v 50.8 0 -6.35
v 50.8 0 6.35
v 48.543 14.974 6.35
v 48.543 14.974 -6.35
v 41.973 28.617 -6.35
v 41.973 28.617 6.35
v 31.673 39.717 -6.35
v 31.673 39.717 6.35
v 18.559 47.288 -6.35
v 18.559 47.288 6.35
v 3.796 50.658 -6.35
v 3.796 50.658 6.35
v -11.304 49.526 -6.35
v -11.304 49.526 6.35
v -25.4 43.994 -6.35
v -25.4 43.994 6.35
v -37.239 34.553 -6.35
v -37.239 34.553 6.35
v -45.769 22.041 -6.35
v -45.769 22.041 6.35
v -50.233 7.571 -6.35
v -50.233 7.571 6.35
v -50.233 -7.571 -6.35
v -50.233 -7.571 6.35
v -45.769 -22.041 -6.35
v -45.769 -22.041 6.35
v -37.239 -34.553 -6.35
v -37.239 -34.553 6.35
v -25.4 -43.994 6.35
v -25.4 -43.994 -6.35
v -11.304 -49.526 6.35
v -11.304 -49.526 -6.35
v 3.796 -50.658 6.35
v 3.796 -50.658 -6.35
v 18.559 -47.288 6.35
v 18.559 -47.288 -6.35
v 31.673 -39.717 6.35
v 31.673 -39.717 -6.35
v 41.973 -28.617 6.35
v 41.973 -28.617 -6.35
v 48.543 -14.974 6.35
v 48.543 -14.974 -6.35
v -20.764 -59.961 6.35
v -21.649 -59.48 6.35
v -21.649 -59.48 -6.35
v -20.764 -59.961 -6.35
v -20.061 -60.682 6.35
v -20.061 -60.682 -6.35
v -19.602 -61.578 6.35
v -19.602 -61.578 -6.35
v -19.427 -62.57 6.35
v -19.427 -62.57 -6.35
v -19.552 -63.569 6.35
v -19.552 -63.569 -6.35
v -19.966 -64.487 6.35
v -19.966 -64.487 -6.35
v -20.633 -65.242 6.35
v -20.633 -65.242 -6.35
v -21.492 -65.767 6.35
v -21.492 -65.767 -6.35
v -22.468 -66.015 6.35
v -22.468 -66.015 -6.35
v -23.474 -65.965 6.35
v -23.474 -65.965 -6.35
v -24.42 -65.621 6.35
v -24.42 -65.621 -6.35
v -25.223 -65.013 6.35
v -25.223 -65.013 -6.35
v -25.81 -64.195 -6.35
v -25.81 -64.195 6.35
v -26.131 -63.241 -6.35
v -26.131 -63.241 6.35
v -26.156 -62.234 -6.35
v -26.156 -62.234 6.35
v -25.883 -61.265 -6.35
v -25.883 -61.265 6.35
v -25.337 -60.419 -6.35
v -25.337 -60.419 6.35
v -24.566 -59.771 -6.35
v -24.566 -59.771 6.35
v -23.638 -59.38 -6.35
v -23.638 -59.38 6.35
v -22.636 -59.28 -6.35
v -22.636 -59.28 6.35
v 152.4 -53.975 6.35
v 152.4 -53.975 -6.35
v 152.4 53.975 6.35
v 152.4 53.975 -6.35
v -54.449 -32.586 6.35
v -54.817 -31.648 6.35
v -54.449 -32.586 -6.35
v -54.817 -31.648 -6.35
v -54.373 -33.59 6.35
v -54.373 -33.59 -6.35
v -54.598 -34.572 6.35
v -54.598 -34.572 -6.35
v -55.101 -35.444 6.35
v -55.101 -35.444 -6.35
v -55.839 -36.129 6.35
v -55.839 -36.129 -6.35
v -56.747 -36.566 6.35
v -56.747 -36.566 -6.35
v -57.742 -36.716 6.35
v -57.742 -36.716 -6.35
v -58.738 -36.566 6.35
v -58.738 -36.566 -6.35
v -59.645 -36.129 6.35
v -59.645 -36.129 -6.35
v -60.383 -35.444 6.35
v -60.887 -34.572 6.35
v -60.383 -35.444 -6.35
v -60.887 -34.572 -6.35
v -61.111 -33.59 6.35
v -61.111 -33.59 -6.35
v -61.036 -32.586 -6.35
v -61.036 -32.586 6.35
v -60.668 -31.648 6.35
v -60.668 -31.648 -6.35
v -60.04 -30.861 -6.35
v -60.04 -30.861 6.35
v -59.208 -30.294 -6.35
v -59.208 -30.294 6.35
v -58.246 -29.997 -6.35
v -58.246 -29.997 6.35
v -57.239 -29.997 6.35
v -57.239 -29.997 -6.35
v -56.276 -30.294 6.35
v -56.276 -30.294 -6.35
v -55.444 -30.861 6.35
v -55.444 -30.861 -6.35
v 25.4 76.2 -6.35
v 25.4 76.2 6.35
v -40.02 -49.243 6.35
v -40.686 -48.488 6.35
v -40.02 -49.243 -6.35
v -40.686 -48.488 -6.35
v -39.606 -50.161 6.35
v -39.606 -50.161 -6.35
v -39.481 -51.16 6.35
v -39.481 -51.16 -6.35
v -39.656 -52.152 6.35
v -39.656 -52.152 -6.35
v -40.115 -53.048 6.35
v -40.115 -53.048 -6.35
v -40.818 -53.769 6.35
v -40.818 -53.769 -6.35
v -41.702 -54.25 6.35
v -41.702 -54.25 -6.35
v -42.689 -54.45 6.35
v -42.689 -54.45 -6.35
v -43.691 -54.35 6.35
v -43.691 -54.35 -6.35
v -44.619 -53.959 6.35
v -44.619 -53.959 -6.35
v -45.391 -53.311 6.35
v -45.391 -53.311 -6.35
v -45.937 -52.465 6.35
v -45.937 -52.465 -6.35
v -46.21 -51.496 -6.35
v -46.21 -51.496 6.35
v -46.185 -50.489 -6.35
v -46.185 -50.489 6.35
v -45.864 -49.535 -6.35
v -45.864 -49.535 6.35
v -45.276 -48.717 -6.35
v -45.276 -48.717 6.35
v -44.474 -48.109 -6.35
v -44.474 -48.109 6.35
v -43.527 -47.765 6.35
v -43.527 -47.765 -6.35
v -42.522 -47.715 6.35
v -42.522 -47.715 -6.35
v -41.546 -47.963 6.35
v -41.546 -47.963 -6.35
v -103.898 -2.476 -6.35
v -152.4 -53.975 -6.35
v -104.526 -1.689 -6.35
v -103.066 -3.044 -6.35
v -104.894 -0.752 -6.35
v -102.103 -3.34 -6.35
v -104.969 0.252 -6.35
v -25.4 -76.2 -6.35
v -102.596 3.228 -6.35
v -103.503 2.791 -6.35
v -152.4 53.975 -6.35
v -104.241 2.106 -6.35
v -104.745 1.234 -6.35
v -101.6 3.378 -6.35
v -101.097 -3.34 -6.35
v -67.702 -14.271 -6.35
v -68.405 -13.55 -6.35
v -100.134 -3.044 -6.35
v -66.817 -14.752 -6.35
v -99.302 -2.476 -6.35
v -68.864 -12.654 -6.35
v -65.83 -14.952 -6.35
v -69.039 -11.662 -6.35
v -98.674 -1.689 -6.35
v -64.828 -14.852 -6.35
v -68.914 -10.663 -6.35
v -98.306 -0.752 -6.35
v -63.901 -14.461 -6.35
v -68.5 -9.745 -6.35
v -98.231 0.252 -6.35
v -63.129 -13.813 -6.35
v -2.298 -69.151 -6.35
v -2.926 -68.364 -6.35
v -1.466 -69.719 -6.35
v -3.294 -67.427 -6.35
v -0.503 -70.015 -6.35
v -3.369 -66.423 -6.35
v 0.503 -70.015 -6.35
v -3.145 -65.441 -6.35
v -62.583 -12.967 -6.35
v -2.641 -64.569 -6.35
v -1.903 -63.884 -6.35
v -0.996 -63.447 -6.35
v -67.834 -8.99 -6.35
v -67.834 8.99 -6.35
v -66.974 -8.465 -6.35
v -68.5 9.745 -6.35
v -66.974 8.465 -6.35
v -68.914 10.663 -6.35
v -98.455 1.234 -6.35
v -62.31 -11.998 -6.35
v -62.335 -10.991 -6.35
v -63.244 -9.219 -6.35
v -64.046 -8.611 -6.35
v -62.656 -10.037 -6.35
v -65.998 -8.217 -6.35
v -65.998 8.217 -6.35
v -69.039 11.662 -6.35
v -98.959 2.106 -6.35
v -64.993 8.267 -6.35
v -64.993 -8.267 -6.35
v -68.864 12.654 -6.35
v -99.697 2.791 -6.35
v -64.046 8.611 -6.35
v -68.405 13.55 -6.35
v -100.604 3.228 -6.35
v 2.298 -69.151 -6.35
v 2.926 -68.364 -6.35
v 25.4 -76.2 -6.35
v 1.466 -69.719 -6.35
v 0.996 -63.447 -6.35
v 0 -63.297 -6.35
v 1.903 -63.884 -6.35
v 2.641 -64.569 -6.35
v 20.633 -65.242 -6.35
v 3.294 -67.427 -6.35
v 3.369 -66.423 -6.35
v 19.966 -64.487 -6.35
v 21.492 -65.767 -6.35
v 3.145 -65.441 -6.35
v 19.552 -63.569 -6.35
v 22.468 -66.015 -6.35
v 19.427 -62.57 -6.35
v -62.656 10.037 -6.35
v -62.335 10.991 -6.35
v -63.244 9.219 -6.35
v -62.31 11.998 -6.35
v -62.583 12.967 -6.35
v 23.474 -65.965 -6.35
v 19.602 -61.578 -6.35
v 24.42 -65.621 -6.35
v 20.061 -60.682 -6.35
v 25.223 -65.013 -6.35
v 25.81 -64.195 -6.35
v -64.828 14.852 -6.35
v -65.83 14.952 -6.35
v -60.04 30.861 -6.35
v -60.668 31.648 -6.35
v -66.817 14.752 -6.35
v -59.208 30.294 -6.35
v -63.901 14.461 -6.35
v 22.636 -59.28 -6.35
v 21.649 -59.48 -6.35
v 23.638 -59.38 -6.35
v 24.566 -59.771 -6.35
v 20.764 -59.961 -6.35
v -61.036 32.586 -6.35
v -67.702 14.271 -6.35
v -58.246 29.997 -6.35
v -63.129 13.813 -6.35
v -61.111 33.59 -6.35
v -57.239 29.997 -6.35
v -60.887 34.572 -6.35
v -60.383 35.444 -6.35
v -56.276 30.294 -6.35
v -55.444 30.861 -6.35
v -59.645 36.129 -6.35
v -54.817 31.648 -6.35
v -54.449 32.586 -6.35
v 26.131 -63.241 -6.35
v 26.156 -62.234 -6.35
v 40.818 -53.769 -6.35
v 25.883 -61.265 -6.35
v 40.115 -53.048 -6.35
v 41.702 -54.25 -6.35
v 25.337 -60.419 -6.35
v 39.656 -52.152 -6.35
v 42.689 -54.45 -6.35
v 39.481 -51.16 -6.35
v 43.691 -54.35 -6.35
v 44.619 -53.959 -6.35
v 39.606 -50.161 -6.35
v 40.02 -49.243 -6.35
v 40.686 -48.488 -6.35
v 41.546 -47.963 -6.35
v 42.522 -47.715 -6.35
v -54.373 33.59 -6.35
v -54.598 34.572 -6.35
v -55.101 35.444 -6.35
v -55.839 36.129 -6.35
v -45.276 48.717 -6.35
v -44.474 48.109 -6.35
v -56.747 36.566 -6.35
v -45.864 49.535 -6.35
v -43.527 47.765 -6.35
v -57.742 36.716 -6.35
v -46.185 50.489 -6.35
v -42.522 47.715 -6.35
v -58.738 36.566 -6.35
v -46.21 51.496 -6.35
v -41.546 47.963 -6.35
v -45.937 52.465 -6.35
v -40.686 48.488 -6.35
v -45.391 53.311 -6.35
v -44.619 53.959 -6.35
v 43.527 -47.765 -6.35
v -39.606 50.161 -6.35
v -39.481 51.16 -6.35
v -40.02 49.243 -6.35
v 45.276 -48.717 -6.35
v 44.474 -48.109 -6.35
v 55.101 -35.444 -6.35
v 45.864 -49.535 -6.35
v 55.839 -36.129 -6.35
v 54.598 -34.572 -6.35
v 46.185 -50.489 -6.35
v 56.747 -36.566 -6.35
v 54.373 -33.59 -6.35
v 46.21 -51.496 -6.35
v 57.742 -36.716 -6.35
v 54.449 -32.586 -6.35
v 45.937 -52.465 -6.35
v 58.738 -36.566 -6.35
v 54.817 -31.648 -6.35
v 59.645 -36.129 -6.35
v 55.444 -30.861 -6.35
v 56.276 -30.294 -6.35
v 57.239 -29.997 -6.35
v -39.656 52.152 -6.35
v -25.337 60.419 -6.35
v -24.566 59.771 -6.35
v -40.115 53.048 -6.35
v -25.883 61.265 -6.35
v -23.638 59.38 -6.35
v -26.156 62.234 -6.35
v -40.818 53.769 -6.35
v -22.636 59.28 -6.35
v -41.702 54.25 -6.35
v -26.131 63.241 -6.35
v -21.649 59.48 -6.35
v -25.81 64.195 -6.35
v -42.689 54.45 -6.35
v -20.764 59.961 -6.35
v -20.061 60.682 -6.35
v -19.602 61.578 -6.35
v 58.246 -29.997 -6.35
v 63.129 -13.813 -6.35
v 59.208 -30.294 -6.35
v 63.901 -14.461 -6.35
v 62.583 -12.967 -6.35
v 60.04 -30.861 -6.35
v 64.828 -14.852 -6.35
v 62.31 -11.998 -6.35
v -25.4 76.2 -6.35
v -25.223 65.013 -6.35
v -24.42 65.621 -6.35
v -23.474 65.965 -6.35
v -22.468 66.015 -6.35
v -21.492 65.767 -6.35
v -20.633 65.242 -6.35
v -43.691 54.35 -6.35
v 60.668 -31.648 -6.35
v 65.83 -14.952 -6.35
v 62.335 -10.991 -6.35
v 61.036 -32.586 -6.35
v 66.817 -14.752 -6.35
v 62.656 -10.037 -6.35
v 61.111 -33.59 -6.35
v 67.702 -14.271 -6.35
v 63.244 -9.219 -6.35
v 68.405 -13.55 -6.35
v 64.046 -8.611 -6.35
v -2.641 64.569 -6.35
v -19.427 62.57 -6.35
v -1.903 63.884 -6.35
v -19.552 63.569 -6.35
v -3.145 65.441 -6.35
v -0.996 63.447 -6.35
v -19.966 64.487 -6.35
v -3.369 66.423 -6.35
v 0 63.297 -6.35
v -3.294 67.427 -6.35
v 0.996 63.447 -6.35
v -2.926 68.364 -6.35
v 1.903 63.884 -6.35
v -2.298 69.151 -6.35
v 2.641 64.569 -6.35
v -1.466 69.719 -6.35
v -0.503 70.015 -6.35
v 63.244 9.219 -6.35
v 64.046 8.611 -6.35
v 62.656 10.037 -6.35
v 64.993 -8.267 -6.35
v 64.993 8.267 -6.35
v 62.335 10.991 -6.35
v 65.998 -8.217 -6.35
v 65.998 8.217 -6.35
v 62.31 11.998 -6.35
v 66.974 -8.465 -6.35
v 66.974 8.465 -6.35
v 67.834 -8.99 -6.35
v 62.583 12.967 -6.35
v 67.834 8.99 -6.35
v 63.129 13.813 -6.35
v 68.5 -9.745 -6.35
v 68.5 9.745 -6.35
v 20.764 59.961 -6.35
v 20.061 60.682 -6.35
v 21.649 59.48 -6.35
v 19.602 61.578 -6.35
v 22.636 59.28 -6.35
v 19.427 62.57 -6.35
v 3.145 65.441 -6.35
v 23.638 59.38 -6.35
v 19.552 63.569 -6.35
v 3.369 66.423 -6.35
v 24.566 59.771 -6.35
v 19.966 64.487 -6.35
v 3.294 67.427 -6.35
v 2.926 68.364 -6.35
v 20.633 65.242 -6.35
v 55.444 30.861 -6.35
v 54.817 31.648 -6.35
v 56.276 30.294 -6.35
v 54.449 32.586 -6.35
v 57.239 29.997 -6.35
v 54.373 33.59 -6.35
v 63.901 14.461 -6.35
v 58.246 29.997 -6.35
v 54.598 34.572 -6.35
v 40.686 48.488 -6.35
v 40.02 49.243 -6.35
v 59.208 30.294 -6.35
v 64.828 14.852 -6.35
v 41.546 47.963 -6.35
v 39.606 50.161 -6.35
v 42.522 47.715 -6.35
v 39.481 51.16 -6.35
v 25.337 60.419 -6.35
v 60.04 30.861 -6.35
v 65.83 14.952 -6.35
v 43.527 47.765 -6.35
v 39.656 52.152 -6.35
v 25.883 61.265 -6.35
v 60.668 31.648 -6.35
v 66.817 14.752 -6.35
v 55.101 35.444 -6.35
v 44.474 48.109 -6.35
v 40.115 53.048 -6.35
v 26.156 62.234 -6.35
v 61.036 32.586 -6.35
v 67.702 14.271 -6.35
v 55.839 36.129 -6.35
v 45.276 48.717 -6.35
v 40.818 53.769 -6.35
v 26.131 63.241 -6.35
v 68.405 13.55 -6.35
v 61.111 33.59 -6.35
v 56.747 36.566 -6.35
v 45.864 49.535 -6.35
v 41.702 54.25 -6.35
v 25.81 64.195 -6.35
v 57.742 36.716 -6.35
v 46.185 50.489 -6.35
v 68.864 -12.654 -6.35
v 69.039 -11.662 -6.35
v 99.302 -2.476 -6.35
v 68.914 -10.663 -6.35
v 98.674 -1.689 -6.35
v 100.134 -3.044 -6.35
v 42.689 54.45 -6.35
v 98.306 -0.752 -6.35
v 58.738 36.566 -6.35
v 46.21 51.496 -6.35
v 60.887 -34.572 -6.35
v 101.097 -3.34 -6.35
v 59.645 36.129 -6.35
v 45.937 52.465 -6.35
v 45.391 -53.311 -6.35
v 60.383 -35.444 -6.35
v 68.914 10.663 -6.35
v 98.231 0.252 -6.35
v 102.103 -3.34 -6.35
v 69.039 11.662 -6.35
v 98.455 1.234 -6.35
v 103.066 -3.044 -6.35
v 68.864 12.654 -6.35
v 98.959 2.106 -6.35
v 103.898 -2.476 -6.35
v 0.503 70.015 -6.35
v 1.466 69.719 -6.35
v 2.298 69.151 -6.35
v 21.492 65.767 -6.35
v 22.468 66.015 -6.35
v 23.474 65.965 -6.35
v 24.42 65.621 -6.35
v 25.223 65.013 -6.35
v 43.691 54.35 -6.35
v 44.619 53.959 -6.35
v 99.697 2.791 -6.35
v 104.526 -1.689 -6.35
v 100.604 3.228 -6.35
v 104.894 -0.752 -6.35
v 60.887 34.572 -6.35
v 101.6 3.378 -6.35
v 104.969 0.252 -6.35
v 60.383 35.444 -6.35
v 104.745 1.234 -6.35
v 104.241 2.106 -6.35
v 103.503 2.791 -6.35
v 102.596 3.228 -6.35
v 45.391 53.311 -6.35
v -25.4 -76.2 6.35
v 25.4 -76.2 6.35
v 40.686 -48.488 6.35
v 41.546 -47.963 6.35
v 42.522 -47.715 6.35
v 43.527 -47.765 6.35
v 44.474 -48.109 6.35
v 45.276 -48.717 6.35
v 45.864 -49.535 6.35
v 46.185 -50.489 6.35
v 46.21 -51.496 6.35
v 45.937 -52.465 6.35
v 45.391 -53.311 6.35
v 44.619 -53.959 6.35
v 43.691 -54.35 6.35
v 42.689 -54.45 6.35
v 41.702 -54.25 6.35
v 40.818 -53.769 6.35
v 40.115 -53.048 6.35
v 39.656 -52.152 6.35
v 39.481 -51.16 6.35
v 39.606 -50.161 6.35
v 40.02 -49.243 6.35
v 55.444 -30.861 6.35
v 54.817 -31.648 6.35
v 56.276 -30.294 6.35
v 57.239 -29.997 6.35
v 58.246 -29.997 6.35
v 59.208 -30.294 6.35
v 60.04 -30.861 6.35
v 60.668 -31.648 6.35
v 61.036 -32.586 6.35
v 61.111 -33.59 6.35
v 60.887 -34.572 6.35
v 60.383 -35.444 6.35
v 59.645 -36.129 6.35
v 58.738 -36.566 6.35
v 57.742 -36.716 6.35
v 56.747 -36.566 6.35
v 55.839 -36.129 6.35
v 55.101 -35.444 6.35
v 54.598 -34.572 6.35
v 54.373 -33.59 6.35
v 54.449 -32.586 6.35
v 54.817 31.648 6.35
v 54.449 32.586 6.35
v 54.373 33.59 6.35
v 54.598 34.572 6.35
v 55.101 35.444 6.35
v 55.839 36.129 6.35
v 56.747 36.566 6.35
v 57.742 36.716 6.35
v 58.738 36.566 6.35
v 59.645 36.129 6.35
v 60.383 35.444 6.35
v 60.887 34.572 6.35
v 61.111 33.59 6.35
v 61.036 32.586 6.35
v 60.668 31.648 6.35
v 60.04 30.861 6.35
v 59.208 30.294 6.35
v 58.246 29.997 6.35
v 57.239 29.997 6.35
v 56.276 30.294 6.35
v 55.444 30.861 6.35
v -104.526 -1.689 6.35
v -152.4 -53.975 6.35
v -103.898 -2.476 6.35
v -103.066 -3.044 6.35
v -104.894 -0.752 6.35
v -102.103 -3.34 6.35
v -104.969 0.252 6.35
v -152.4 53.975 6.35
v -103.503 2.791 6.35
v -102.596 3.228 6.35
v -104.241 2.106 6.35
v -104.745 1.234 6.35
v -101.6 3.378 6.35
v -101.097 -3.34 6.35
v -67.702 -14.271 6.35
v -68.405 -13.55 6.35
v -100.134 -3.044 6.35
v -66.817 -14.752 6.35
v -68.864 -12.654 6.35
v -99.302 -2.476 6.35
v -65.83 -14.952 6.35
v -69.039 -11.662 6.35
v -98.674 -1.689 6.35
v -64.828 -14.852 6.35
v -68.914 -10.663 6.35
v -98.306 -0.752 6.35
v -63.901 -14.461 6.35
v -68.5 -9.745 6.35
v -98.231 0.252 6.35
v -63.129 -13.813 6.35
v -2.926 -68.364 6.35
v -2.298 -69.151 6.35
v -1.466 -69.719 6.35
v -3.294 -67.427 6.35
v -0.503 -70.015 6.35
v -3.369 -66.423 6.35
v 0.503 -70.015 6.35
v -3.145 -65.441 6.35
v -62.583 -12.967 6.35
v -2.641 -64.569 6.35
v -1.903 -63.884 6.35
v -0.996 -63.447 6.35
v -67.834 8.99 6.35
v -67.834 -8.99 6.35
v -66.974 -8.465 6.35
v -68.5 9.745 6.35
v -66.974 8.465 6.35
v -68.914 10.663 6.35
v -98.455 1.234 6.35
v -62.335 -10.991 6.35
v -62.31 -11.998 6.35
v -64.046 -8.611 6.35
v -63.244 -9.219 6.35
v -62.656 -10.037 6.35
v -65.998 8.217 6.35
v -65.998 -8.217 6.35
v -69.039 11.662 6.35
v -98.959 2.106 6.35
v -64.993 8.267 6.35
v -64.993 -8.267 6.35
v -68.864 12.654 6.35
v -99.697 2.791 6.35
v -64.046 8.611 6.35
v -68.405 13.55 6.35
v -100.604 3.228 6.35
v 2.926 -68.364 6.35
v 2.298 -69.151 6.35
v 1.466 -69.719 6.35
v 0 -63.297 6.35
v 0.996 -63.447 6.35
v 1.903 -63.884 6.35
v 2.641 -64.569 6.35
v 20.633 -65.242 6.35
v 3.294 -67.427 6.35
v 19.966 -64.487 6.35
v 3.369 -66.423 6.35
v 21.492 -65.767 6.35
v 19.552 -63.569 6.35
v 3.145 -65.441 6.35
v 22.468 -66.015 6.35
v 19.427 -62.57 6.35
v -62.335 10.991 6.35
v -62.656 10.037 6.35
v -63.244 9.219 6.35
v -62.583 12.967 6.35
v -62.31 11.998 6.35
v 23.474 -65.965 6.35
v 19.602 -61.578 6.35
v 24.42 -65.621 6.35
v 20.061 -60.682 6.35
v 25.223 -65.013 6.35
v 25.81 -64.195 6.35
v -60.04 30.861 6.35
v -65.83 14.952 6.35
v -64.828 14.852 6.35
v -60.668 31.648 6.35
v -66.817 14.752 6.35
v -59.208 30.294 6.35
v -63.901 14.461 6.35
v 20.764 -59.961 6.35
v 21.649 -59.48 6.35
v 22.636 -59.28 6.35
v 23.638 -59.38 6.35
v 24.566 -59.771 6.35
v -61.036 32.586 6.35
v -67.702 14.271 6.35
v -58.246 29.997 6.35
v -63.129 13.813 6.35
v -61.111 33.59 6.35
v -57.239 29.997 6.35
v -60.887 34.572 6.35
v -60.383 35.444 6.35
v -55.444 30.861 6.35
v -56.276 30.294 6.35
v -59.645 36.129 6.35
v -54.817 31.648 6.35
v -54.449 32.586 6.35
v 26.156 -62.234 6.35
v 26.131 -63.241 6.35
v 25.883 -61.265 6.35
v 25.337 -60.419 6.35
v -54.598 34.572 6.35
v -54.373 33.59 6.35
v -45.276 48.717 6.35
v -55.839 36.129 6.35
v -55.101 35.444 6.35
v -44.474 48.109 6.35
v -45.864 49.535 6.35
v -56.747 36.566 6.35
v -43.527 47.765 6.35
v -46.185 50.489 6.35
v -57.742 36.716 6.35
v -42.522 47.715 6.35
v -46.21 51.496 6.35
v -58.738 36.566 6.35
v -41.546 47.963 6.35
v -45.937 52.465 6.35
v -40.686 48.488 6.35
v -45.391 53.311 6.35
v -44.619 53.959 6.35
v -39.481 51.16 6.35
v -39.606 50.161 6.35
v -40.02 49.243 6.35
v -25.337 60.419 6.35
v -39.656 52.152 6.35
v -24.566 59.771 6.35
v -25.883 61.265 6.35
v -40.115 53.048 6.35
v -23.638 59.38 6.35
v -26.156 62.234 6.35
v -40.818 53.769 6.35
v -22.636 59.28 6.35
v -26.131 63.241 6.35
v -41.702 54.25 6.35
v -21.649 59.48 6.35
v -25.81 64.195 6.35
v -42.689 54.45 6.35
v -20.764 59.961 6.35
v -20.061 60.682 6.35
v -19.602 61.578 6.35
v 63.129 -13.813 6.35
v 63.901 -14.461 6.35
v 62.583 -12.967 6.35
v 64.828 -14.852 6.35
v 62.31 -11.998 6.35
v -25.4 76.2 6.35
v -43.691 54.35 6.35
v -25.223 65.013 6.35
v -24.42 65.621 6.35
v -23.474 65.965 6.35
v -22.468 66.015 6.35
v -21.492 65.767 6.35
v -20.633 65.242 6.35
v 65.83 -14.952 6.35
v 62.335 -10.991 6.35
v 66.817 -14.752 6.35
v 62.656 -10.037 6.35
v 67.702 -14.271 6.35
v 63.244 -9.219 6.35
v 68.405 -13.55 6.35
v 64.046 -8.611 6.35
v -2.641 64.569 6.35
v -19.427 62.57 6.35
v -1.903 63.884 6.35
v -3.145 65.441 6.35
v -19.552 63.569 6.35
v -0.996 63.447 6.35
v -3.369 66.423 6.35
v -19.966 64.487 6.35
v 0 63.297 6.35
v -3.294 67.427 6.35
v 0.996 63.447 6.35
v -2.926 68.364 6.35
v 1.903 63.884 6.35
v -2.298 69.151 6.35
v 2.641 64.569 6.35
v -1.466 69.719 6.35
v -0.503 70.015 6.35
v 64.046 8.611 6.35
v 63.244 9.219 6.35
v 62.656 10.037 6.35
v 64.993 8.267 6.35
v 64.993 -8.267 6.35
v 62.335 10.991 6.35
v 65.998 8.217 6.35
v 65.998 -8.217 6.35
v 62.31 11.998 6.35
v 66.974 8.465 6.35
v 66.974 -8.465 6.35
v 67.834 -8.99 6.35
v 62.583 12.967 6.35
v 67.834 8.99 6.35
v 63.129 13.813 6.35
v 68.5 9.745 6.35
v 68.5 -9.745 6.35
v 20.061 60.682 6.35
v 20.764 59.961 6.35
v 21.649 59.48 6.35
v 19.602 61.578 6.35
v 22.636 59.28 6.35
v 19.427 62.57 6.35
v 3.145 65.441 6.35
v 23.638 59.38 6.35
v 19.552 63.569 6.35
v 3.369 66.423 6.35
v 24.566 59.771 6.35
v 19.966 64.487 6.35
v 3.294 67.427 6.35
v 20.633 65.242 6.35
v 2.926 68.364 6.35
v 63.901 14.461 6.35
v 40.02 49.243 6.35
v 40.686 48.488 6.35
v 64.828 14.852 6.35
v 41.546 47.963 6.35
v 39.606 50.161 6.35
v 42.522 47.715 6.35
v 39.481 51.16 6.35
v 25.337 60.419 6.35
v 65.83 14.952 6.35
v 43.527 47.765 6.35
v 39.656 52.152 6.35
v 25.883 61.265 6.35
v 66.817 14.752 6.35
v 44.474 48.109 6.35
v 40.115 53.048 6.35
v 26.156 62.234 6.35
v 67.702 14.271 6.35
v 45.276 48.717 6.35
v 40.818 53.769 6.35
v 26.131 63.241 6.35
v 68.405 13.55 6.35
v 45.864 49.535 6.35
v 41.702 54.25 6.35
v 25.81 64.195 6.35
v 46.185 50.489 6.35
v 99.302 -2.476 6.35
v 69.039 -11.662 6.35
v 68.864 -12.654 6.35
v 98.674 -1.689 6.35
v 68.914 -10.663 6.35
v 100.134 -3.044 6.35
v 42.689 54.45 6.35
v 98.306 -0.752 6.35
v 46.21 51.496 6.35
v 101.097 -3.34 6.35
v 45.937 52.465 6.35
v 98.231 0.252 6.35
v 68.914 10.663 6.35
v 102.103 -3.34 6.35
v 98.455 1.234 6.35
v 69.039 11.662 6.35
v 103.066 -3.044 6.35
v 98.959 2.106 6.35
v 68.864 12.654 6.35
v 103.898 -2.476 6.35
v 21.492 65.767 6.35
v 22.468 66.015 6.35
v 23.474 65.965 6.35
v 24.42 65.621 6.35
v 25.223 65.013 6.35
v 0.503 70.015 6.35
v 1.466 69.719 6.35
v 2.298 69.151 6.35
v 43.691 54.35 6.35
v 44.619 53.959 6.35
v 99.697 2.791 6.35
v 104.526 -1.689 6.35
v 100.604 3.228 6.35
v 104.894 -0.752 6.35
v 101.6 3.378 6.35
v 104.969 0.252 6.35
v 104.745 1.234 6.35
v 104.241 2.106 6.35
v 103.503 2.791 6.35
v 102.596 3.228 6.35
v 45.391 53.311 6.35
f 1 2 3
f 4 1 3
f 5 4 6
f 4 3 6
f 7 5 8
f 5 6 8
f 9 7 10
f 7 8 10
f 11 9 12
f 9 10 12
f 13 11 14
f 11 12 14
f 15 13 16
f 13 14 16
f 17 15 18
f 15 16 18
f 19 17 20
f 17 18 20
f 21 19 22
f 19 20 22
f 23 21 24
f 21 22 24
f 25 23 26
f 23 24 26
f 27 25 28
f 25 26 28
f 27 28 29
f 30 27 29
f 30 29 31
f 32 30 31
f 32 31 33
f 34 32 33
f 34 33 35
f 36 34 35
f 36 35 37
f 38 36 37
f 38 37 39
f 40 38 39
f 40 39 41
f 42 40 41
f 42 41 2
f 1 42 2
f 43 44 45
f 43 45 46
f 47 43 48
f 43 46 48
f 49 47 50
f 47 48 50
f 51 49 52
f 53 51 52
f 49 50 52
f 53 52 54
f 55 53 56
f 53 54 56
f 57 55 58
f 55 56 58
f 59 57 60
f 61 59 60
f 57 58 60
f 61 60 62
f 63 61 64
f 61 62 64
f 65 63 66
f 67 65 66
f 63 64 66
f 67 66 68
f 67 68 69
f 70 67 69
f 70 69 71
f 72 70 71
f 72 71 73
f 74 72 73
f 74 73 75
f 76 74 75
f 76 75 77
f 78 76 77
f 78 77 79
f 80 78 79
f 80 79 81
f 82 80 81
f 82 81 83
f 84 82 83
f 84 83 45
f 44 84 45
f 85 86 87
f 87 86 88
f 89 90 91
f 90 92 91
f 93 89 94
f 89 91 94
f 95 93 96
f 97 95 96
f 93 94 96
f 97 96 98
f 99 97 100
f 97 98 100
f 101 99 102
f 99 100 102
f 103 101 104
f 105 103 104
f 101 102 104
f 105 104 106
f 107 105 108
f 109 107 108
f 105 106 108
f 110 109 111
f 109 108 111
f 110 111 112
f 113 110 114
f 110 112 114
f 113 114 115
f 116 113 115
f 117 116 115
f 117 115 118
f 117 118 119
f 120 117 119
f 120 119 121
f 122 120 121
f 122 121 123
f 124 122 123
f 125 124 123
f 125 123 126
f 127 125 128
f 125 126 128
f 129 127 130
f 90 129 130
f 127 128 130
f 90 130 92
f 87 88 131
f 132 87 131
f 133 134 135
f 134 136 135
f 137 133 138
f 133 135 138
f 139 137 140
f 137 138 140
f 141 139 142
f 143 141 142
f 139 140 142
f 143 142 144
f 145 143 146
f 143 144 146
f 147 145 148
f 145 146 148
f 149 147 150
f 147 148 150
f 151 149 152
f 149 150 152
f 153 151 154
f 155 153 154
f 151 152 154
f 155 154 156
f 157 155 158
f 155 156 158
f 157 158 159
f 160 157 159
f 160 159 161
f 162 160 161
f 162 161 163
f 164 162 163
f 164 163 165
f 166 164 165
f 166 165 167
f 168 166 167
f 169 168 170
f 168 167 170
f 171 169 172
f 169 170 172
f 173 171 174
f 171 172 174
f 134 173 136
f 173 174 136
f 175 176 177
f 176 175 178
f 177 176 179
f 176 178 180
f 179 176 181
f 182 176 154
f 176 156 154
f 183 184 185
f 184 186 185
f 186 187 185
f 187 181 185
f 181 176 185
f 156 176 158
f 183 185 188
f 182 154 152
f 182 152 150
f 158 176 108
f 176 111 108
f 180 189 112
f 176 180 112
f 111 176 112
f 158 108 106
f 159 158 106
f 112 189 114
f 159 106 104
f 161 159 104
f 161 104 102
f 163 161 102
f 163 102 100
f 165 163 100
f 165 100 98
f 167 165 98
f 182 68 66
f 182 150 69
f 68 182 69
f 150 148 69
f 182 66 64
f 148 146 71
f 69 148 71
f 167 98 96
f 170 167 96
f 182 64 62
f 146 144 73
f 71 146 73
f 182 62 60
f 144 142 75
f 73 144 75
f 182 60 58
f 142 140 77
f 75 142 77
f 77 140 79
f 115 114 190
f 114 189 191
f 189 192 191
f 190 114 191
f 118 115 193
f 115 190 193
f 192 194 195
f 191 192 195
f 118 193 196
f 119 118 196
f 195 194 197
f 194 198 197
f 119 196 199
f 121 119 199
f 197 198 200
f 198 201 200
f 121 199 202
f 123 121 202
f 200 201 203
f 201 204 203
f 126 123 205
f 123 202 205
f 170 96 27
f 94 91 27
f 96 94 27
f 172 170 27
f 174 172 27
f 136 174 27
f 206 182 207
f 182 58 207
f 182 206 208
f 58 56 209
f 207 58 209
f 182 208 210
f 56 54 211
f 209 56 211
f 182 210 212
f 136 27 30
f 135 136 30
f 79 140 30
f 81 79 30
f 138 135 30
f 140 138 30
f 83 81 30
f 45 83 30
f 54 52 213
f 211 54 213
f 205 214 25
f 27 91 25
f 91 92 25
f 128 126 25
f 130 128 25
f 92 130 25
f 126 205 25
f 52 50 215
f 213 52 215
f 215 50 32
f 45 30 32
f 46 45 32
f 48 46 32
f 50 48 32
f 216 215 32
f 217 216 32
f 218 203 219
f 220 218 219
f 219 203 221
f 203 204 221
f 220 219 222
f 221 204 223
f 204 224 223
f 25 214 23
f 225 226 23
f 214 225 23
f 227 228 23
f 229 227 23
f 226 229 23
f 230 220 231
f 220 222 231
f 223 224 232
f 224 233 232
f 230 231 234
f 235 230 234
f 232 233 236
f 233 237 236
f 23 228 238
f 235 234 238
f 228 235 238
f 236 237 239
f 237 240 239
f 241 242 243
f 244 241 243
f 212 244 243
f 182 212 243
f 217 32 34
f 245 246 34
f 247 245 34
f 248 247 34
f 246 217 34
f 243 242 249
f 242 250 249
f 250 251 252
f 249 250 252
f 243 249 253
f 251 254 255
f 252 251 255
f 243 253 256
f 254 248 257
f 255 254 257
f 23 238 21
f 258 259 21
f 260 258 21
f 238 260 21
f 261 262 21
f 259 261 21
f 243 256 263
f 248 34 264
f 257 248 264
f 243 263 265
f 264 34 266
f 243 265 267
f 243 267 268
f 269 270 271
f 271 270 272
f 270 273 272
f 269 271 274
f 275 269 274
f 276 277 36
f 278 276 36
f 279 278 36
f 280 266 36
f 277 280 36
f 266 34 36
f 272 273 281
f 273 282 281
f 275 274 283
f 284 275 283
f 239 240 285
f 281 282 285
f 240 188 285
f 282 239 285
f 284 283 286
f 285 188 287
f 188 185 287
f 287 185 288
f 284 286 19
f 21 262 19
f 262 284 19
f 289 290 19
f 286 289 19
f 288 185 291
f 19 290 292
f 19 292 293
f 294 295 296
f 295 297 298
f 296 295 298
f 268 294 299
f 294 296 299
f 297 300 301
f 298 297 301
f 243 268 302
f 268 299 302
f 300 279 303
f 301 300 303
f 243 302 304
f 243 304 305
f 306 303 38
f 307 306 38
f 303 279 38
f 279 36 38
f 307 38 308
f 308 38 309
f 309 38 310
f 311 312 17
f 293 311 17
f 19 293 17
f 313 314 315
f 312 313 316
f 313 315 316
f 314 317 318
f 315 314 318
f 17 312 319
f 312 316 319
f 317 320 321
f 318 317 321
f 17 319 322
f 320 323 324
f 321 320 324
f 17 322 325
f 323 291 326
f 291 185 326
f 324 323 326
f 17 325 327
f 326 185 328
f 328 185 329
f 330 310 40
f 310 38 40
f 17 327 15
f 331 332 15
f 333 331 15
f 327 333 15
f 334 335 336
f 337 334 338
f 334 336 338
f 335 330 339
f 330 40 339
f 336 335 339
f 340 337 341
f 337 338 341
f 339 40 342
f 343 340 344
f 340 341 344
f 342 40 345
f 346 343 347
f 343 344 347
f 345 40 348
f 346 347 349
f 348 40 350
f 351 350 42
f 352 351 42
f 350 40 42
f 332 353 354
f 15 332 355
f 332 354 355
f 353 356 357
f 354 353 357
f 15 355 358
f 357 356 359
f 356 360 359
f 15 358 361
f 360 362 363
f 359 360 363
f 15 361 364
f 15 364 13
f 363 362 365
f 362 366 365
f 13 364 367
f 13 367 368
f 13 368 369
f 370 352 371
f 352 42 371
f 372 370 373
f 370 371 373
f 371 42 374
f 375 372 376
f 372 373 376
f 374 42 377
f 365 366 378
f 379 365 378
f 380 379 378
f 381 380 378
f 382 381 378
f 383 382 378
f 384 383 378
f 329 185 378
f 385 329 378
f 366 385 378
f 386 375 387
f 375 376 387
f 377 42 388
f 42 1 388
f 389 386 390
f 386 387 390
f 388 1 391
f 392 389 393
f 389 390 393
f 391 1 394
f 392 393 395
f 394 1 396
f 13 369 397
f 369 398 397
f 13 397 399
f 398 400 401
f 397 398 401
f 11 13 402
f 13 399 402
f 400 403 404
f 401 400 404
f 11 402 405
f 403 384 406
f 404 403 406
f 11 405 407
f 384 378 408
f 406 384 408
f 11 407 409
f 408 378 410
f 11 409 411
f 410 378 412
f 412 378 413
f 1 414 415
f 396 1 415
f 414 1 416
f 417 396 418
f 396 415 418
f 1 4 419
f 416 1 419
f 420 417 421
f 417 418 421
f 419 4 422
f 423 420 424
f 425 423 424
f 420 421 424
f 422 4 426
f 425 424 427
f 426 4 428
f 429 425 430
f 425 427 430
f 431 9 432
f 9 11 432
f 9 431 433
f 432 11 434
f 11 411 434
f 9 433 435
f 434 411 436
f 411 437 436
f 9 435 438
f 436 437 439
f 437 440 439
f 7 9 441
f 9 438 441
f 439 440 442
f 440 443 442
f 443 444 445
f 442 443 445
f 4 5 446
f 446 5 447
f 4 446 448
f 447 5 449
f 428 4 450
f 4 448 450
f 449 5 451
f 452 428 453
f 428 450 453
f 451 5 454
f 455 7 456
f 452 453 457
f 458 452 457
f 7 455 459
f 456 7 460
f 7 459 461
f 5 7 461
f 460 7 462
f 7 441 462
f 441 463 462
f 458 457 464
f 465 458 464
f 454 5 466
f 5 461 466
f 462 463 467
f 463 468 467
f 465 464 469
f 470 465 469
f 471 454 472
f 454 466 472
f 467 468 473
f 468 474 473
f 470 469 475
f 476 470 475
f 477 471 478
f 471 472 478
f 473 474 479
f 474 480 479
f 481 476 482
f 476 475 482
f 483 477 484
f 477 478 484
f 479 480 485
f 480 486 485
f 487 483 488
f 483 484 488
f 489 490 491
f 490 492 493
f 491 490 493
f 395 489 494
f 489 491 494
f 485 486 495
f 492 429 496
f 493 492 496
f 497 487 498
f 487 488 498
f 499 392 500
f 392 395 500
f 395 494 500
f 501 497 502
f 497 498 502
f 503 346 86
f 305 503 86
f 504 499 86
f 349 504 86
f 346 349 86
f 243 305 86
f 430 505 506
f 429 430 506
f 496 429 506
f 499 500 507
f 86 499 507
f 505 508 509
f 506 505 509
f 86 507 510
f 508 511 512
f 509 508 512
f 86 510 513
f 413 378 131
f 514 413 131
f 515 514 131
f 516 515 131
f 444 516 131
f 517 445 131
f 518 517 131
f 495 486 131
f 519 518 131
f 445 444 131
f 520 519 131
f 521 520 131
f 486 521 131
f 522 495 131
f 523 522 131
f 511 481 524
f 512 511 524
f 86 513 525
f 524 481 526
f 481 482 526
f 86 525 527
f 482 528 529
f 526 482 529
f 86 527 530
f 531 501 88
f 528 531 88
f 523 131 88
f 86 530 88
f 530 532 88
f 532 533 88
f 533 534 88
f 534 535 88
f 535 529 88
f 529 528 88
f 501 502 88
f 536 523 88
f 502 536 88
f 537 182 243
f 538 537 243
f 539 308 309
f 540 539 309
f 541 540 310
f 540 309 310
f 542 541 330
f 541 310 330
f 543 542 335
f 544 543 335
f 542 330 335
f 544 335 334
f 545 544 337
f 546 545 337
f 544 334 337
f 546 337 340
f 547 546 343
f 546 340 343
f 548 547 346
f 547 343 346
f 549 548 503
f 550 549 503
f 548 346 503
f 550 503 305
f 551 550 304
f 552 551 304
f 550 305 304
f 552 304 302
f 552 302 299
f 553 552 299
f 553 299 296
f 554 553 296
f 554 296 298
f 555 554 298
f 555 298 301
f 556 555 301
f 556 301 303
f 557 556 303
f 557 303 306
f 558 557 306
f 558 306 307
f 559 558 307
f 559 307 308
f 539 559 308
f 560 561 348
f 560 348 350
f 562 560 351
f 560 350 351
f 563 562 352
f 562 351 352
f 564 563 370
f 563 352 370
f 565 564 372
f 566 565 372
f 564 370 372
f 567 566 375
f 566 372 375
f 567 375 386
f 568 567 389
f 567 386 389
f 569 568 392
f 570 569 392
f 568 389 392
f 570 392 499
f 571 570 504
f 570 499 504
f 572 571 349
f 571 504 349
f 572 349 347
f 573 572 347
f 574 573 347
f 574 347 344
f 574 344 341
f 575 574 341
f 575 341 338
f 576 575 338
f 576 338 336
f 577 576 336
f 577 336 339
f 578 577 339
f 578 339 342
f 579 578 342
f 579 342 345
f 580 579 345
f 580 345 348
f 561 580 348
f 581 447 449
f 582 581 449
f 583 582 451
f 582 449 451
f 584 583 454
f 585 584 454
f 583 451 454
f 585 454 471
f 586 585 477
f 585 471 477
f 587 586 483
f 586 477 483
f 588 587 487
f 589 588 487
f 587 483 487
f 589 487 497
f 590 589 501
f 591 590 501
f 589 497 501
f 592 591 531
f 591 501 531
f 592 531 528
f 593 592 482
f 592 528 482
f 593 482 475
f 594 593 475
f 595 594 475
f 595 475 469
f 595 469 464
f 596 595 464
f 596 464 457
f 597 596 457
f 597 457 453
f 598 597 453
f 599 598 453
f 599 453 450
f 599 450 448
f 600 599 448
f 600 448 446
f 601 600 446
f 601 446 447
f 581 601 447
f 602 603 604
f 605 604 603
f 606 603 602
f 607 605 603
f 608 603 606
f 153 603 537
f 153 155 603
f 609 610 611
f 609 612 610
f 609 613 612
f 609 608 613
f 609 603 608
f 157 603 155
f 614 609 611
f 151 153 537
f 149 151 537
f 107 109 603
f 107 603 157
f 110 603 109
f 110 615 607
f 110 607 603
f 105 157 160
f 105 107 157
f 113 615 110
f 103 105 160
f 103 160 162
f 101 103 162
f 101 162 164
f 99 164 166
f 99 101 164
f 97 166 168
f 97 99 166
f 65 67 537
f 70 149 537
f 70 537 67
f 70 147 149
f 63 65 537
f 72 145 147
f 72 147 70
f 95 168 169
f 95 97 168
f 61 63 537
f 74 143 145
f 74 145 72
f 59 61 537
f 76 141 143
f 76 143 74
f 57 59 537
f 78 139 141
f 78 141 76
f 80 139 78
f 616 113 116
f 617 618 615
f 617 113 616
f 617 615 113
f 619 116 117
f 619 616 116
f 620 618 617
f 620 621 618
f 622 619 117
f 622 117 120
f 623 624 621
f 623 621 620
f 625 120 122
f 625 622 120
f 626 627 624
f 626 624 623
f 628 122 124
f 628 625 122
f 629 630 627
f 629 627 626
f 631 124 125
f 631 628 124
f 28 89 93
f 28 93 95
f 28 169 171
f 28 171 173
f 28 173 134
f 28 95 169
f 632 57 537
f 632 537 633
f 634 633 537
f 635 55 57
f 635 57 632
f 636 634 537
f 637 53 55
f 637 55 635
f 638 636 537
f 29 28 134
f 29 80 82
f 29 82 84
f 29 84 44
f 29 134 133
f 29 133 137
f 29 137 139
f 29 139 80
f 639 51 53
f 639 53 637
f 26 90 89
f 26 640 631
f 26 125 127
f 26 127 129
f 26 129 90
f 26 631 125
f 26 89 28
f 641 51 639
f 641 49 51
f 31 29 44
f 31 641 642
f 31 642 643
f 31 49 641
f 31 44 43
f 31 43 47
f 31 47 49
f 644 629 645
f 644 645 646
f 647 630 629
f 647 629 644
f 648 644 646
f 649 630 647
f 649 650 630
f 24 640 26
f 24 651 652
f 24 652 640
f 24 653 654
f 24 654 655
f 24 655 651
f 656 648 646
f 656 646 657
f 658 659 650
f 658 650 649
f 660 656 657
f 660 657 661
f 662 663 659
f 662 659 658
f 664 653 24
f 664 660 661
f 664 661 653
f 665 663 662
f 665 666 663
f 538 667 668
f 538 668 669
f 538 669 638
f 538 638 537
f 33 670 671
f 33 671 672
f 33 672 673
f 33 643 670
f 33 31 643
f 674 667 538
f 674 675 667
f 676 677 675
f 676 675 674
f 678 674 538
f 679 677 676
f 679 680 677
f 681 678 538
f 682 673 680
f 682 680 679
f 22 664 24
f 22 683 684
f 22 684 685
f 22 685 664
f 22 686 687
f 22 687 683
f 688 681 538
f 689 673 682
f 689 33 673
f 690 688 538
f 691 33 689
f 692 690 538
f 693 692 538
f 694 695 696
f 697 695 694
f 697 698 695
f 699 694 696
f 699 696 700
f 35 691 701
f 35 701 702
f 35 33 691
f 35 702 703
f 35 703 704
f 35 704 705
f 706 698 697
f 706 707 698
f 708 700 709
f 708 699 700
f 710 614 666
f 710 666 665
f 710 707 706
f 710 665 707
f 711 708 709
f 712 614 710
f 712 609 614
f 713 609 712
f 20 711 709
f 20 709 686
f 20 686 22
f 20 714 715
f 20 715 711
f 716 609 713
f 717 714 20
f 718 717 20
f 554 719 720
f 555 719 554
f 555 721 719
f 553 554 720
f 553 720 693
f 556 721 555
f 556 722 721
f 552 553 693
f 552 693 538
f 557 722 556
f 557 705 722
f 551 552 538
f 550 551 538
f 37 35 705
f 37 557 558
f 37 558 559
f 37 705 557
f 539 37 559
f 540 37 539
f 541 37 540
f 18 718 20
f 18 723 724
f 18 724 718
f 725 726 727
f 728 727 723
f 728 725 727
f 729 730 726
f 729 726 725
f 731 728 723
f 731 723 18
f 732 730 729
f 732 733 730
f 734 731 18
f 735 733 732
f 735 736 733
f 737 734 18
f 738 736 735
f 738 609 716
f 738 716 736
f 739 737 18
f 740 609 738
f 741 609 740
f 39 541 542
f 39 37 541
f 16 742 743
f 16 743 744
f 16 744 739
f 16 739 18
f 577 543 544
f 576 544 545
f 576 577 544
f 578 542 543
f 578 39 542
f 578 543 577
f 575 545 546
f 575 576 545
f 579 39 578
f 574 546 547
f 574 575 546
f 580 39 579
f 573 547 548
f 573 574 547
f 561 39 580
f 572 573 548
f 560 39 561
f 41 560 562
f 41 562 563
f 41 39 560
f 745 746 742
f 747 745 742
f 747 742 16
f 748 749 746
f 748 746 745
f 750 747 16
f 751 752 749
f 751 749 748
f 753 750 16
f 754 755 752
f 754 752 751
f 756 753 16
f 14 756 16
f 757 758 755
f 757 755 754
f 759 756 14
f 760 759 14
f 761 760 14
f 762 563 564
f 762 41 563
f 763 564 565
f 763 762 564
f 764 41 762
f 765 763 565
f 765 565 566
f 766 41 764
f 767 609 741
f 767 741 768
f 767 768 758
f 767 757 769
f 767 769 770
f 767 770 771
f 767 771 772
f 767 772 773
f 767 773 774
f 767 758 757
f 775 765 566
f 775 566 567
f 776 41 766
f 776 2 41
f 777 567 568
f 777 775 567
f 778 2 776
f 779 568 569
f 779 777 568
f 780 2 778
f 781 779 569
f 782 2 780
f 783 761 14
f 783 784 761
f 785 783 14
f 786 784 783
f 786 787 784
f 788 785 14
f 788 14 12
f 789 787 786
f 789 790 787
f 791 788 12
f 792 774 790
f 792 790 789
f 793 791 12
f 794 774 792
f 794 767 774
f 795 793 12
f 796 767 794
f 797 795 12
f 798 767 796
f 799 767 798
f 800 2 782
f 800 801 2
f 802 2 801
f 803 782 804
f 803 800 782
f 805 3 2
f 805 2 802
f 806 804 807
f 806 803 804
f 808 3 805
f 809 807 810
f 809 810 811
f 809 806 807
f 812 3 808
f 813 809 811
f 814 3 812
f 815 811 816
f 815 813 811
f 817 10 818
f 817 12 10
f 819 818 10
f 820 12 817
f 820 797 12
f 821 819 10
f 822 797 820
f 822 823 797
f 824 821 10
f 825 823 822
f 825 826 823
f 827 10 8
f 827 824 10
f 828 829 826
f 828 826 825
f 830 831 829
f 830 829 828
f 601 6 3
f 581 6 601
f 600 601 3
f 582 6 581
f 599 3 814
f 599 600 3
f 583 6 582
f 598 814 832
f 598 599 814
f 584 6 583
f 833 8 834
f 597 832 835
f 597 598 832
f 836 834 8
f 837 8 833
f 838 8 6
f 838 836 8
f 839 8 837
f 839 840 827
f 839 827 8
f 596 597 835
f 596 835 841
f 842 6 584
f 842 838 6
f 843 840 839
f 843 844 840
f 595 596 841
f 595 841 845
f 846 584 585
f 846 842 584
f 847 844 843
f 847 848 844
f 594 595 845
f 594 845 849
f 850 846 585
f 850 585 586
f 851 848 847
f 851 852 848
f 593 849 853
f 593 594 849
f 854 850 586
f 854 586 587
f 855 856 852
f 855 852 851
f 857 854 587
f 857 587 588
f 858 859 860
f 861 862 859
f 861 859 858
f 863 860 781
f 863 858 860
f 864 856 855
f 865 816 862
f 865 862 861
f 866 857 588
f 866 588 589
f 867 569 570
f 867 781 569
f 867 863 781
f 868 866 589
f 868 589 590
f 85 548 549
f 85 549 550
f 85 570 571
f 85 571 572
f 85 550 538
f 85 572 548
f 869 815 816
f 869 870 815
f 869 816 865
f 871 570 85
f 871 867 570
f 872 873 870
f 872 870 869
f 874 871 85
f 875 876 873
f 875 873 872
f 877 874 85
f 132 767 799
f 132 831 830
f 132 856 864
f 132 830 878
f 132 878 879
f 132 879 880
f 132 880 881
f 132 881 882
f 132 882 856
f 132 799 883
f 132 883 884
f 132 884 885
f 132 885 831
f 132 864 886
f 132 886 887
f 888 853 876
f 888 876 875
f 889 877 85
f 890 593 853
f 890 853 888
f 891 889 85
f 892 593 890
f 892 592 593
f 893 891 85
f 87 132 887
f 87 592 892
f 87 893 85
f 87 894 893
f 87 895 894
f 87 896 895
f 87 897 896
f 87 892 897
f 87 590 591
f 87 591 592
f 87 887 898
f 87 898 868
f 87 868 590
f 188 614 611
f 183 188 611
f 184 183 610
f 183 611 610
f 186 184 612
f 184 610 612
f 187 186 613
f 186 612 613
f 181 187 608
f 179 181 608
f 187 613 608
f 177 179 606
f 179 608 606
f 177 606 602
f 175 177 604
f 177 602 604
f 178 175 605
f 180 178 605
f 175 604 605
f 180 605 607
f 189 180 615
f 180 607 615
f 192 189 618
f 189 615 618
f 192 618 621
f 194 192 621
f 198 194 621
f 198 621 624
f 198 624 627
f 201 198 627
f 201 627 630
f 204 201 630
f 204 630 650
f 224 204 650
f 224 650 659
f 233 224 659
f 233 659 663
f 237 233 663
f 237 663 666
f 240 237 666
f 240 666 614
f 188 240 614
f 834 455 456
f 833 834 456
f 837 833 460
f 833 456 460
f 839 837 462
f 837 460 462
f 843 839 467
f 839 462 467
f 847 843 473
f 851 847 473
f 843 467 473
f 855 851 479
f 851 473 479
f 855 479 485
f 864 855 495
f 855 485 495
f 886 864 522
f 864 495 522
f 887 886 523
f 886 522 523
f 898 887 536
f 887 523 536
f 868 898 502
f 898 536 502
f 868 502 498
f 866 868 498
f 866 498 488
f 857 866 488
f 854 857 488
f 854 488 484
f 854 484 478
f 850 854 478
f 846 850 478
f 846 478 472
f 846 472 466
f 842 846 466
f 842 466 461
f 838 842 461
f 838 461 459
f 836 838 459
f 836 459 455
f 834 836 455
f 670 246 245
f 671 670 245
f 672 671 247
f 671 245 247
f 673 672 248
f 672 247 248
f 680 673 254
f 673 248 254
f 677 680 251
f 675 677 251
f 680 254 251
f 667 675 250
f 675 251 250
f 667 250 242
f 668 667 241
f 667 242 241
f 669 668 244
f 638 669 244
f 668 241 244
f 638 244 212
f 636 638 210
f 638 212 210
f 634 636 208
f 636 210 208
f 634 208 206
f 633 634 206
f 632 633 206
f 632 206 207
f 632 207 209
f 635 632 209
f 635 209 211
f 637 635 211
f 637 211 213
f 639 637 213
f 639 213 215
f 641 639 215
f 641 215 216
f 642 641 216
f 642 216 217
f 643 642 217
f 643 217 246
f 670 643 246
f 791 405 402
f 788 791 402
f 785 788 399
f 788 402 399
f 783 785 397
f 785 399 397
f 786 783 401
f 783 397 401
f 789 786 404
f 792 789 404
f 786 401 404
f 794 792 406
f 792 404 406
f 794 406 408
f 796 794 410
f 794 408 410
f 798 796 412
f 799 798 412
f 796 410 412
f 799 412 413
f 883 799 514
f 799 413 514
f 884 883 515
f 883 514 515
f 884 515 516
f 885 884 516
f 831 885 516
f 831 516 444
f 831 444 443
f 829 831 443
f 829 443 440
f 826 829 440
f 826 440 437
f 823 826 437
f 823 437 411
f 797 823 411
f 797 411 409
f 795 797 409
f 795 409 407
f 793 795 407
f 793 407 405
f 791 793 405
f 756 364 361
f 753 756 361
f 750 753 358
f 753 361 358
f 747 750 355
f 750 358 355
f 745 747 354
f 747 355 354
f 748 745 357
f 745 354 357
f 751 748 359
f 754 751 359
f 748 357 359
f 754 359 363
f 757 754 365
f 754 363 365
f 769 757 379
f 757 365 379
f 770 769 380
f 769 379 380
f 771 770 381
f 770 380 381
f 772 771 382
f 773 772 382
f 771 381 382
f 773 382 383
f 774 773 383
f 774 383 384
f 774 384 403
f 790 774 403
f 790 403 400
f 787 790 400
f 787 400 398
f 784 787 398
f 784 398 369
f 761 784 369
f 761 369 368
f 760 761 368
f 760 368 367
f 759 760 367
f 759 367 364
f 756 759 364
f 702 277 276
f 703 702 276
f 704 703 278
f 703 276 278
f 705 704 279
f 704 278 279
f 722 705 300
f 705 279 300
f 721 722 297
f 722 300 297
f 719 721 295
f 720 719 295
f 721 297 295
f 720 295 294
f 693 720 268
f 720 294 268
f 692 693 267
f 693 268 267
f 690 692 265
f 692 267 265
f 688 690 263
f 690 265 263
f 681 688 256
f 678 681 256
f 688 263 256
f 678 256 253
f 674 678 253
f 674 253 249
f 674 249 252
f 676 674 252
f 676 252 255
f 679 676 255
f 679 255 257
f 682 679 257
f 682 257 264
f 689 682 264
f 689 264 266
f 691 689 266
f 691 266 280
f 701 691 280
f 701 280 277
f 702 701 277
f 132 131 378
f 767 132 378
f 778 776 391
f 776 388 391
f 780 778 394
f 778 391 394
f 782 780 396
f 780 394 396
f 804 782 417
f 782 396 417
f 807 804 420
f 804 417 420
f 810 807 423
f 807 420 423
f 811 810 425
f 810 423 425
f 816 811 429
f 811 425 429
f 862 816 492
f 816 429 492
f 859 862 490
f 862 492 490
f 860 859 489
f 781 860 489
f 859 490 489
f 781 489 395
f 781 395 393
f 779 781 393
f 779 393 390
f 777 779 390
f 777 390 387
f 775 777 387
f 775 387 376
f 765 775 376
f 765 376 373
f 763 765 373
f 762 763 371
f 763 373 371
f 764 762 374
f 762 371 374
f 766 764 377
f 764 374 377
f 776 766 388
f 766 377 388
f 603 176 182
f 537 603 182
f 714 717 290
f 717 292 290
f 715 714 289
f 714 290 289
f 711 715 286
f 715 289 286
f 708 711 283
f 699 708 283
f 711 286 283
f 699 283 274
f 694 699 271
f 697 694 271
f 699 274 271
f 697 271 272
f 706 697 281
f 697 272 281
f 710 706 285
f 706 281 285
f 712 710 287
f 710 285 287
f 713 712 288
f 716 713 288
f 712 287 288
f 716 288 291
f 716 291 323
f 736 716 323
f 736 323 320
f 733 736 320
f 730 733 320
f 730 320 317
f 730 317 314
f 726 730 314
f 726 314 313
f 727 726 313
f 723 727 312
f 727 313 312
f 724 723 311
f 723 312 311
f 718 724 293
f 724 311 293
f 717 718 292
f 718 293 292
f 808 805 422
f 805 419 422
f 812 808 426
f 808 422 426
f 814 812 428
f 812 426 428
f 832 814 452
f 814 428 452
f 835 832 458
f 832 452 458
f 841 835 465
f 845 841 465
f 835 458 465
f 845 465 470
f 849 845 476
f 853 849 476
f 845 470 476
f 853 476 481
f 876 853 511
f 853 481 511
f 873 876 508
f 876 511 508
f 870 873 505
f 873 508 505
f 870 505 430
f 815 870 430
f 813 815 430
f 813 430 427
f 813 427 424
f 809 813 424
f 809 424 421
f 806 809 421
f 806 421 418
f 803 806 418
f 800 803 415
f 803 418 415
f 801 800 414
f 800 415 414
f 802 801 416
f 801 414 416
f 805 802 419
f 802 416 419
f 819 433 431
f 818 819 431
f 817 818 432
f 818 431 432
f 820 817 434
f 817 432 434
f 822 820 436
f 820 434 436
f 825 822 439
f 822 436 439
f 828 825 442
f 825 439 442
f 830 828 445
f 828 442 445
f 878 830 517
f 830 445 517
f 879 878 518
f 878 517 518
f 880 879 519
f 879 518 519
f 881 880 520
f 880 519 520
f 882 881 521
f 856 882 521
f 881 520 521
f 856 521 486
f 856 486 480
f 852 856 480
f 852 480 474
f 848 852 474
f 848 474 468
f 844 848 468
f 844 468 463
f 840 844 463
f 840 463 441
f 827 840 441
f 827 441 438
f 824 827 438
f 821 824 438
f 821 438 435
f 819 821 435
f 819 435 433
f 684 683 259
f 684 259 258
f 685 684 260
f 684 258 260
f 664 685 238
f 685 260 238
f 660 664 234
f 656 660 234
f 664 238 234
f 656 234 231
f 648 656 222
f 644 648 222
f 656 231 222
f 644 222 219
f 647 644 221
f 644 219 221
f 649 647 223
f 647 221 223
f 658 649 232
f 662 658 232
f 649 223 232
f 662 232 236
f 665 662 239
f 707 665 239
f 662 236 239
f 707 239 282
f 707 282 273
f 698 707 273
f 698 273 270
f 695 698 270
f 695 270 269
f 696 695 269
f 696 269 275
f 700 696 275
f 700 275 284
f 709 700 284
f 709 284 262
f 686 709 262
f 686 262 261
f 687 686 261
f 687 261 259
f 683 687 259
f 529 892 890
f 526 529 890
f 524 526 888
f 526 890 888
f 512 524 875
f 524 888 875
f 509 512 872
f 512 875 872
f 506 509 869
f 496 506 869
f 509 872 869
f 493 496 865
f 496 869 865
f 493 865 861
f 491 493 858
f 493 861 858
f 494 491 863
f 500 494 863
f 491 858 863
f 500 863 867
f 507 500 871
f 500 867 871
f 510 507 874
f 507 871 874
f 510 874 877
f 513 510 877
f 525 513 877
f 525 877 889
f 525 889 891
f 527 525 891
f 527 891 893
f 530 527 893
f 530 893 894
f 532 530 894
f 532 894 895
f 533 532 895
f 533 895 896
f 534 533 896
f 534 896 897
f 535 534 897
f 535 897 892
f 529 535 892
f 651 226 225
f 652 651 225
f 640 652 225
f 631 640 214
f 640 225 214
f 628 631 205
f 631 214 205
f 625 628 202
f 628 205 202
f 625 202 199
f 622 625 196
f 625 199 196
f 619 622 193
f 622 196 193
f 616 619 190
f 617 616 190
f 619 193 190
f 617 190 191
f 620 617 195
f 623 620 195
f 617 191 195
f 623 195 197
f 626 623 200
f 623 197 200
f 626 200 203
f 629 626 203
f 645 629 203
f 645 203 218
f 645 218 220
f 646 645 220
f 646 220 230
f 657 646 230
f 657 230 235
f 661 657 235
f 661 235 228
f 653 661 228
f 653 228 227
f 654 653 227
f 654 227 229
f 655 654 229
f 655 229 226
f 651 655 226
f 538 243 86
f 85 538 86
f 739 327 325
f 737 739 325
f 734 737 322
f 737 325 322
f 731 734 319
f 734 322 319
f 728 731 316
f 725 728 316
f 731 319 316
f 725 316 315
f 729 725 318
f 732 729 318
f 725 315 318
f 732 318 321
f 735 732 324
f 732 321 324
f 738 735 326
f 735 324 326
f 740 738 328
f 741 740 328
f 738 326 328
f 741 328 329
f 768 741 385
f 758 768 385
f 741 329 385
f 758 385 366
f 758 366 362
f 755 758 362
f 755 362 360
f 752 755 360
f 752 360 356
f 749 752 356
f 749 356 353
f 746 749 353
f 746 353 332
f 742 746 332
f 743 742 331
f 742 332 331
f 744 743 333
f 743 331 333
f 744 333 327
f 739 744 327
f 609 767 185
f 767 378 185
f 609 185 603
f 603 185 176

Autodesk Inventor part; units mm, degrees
ref_plane "YZ Plane" through (0, 0, 0) normal (1, 0, 0) x (0, 1, 0)
ref_plane "XZ Plane" through (0, 0, 0) normal (0, 1, 0) x (-1, 0, 0)
ref_plane "XY Plane" through (0, 0, 0) normal (0, 0, 1) x (1, 0, 0)
sketch "Sketch1" plane through (0, 0, 0) normal (0, 0, 1) x (1, 0, 0)
  line L0 (-152.4, 53.975) -> (-152.4, -53.975)
  line L1 (-152.4, -53.975) -> (-25.4, -76.2)
  line L2 (-25.4, -76.2) -> (25.4, -76.2)
  line L3 (25.4, -76.2) -> (152.4, -53.975)
  line L4 (152.4, -53.975) -> (152.4, 53.975)
  line L5 (152.4, 53.975) -> (25.4, 76.2)
  line L6 (25.4, 76.2) -> (-25.4, 76.2)
  line L7 (-25.4, 76.2) -> (-152.4, 53.975)
  point P0 (0, 0)
  dimension "d59" = 152.4
  dimension "d60" = 304.8
  dimension "d61" = 76.2
  dimension "d62" = 152.4
  dimension "d64" = 50.8
  dimension "d65" = 25.4
  dimension "d66" = 107.95
extrude "Extrusion1" add sketch "Sketch1" along normal mid plane 12.7
sketch "Sketch2" plane through (0, 0, 6.35) normal (0, 0, 1) x (1, 0, 0)
  circle A0 centre (0, 0) radius 50.8
  dimension "d4" = 101.6
extrude "Extrusion2" cut sketch "Sketch2" against normal through all
sketch "Sketch5" plane through (0, 0, 6.35) normal (0, 0, 1) x (1, 0, 0)
  circle A0 centre (0, 0) radius 66.675 construction
  point P0 (0, 66.675)
  dimension "d36" = 133.35
hole "Hole1" at (0, 66.675, 6.35) direction (0, 0, -1) diameter 6.7564 end through all clearance for "Flat Head Machine Screw (82)" size "1/4" standard "Ansi Unified Screw Threads"
pattern_circular "Circular Pattern1" count 18 over 360 about axis through (0, 0, 6.35) along (0, 0, -1) of "Hole1"
sketch "Sketch6" plane through (0, 0, -6.35) normal (0, 0, -1) x (-1, 0, 0)
  point P0 (0, 0)
  point P1 (-101.6, 0)
  point P2 (101.6, 0)
  dimension "d47" = 203.2
  dimension "d48" = 101.6
hole "Hole2" at (101.6, 0, -6.35) at (-101.6, 0, -6.35) direction (0, 0, 1) diameter 6.7564 end through all clearance for "Socket Head Cap Screw" size "1/4" standard "Ansi Unified Screw Threads"
equation "\"d61\" = 0.5 * d59"
equation "\"d62\" = 0.5 * d60"
equation "\"d65\" = 0.5 * d64"
properties part number "ODSY-0007-002" material "Stainless Steel"
